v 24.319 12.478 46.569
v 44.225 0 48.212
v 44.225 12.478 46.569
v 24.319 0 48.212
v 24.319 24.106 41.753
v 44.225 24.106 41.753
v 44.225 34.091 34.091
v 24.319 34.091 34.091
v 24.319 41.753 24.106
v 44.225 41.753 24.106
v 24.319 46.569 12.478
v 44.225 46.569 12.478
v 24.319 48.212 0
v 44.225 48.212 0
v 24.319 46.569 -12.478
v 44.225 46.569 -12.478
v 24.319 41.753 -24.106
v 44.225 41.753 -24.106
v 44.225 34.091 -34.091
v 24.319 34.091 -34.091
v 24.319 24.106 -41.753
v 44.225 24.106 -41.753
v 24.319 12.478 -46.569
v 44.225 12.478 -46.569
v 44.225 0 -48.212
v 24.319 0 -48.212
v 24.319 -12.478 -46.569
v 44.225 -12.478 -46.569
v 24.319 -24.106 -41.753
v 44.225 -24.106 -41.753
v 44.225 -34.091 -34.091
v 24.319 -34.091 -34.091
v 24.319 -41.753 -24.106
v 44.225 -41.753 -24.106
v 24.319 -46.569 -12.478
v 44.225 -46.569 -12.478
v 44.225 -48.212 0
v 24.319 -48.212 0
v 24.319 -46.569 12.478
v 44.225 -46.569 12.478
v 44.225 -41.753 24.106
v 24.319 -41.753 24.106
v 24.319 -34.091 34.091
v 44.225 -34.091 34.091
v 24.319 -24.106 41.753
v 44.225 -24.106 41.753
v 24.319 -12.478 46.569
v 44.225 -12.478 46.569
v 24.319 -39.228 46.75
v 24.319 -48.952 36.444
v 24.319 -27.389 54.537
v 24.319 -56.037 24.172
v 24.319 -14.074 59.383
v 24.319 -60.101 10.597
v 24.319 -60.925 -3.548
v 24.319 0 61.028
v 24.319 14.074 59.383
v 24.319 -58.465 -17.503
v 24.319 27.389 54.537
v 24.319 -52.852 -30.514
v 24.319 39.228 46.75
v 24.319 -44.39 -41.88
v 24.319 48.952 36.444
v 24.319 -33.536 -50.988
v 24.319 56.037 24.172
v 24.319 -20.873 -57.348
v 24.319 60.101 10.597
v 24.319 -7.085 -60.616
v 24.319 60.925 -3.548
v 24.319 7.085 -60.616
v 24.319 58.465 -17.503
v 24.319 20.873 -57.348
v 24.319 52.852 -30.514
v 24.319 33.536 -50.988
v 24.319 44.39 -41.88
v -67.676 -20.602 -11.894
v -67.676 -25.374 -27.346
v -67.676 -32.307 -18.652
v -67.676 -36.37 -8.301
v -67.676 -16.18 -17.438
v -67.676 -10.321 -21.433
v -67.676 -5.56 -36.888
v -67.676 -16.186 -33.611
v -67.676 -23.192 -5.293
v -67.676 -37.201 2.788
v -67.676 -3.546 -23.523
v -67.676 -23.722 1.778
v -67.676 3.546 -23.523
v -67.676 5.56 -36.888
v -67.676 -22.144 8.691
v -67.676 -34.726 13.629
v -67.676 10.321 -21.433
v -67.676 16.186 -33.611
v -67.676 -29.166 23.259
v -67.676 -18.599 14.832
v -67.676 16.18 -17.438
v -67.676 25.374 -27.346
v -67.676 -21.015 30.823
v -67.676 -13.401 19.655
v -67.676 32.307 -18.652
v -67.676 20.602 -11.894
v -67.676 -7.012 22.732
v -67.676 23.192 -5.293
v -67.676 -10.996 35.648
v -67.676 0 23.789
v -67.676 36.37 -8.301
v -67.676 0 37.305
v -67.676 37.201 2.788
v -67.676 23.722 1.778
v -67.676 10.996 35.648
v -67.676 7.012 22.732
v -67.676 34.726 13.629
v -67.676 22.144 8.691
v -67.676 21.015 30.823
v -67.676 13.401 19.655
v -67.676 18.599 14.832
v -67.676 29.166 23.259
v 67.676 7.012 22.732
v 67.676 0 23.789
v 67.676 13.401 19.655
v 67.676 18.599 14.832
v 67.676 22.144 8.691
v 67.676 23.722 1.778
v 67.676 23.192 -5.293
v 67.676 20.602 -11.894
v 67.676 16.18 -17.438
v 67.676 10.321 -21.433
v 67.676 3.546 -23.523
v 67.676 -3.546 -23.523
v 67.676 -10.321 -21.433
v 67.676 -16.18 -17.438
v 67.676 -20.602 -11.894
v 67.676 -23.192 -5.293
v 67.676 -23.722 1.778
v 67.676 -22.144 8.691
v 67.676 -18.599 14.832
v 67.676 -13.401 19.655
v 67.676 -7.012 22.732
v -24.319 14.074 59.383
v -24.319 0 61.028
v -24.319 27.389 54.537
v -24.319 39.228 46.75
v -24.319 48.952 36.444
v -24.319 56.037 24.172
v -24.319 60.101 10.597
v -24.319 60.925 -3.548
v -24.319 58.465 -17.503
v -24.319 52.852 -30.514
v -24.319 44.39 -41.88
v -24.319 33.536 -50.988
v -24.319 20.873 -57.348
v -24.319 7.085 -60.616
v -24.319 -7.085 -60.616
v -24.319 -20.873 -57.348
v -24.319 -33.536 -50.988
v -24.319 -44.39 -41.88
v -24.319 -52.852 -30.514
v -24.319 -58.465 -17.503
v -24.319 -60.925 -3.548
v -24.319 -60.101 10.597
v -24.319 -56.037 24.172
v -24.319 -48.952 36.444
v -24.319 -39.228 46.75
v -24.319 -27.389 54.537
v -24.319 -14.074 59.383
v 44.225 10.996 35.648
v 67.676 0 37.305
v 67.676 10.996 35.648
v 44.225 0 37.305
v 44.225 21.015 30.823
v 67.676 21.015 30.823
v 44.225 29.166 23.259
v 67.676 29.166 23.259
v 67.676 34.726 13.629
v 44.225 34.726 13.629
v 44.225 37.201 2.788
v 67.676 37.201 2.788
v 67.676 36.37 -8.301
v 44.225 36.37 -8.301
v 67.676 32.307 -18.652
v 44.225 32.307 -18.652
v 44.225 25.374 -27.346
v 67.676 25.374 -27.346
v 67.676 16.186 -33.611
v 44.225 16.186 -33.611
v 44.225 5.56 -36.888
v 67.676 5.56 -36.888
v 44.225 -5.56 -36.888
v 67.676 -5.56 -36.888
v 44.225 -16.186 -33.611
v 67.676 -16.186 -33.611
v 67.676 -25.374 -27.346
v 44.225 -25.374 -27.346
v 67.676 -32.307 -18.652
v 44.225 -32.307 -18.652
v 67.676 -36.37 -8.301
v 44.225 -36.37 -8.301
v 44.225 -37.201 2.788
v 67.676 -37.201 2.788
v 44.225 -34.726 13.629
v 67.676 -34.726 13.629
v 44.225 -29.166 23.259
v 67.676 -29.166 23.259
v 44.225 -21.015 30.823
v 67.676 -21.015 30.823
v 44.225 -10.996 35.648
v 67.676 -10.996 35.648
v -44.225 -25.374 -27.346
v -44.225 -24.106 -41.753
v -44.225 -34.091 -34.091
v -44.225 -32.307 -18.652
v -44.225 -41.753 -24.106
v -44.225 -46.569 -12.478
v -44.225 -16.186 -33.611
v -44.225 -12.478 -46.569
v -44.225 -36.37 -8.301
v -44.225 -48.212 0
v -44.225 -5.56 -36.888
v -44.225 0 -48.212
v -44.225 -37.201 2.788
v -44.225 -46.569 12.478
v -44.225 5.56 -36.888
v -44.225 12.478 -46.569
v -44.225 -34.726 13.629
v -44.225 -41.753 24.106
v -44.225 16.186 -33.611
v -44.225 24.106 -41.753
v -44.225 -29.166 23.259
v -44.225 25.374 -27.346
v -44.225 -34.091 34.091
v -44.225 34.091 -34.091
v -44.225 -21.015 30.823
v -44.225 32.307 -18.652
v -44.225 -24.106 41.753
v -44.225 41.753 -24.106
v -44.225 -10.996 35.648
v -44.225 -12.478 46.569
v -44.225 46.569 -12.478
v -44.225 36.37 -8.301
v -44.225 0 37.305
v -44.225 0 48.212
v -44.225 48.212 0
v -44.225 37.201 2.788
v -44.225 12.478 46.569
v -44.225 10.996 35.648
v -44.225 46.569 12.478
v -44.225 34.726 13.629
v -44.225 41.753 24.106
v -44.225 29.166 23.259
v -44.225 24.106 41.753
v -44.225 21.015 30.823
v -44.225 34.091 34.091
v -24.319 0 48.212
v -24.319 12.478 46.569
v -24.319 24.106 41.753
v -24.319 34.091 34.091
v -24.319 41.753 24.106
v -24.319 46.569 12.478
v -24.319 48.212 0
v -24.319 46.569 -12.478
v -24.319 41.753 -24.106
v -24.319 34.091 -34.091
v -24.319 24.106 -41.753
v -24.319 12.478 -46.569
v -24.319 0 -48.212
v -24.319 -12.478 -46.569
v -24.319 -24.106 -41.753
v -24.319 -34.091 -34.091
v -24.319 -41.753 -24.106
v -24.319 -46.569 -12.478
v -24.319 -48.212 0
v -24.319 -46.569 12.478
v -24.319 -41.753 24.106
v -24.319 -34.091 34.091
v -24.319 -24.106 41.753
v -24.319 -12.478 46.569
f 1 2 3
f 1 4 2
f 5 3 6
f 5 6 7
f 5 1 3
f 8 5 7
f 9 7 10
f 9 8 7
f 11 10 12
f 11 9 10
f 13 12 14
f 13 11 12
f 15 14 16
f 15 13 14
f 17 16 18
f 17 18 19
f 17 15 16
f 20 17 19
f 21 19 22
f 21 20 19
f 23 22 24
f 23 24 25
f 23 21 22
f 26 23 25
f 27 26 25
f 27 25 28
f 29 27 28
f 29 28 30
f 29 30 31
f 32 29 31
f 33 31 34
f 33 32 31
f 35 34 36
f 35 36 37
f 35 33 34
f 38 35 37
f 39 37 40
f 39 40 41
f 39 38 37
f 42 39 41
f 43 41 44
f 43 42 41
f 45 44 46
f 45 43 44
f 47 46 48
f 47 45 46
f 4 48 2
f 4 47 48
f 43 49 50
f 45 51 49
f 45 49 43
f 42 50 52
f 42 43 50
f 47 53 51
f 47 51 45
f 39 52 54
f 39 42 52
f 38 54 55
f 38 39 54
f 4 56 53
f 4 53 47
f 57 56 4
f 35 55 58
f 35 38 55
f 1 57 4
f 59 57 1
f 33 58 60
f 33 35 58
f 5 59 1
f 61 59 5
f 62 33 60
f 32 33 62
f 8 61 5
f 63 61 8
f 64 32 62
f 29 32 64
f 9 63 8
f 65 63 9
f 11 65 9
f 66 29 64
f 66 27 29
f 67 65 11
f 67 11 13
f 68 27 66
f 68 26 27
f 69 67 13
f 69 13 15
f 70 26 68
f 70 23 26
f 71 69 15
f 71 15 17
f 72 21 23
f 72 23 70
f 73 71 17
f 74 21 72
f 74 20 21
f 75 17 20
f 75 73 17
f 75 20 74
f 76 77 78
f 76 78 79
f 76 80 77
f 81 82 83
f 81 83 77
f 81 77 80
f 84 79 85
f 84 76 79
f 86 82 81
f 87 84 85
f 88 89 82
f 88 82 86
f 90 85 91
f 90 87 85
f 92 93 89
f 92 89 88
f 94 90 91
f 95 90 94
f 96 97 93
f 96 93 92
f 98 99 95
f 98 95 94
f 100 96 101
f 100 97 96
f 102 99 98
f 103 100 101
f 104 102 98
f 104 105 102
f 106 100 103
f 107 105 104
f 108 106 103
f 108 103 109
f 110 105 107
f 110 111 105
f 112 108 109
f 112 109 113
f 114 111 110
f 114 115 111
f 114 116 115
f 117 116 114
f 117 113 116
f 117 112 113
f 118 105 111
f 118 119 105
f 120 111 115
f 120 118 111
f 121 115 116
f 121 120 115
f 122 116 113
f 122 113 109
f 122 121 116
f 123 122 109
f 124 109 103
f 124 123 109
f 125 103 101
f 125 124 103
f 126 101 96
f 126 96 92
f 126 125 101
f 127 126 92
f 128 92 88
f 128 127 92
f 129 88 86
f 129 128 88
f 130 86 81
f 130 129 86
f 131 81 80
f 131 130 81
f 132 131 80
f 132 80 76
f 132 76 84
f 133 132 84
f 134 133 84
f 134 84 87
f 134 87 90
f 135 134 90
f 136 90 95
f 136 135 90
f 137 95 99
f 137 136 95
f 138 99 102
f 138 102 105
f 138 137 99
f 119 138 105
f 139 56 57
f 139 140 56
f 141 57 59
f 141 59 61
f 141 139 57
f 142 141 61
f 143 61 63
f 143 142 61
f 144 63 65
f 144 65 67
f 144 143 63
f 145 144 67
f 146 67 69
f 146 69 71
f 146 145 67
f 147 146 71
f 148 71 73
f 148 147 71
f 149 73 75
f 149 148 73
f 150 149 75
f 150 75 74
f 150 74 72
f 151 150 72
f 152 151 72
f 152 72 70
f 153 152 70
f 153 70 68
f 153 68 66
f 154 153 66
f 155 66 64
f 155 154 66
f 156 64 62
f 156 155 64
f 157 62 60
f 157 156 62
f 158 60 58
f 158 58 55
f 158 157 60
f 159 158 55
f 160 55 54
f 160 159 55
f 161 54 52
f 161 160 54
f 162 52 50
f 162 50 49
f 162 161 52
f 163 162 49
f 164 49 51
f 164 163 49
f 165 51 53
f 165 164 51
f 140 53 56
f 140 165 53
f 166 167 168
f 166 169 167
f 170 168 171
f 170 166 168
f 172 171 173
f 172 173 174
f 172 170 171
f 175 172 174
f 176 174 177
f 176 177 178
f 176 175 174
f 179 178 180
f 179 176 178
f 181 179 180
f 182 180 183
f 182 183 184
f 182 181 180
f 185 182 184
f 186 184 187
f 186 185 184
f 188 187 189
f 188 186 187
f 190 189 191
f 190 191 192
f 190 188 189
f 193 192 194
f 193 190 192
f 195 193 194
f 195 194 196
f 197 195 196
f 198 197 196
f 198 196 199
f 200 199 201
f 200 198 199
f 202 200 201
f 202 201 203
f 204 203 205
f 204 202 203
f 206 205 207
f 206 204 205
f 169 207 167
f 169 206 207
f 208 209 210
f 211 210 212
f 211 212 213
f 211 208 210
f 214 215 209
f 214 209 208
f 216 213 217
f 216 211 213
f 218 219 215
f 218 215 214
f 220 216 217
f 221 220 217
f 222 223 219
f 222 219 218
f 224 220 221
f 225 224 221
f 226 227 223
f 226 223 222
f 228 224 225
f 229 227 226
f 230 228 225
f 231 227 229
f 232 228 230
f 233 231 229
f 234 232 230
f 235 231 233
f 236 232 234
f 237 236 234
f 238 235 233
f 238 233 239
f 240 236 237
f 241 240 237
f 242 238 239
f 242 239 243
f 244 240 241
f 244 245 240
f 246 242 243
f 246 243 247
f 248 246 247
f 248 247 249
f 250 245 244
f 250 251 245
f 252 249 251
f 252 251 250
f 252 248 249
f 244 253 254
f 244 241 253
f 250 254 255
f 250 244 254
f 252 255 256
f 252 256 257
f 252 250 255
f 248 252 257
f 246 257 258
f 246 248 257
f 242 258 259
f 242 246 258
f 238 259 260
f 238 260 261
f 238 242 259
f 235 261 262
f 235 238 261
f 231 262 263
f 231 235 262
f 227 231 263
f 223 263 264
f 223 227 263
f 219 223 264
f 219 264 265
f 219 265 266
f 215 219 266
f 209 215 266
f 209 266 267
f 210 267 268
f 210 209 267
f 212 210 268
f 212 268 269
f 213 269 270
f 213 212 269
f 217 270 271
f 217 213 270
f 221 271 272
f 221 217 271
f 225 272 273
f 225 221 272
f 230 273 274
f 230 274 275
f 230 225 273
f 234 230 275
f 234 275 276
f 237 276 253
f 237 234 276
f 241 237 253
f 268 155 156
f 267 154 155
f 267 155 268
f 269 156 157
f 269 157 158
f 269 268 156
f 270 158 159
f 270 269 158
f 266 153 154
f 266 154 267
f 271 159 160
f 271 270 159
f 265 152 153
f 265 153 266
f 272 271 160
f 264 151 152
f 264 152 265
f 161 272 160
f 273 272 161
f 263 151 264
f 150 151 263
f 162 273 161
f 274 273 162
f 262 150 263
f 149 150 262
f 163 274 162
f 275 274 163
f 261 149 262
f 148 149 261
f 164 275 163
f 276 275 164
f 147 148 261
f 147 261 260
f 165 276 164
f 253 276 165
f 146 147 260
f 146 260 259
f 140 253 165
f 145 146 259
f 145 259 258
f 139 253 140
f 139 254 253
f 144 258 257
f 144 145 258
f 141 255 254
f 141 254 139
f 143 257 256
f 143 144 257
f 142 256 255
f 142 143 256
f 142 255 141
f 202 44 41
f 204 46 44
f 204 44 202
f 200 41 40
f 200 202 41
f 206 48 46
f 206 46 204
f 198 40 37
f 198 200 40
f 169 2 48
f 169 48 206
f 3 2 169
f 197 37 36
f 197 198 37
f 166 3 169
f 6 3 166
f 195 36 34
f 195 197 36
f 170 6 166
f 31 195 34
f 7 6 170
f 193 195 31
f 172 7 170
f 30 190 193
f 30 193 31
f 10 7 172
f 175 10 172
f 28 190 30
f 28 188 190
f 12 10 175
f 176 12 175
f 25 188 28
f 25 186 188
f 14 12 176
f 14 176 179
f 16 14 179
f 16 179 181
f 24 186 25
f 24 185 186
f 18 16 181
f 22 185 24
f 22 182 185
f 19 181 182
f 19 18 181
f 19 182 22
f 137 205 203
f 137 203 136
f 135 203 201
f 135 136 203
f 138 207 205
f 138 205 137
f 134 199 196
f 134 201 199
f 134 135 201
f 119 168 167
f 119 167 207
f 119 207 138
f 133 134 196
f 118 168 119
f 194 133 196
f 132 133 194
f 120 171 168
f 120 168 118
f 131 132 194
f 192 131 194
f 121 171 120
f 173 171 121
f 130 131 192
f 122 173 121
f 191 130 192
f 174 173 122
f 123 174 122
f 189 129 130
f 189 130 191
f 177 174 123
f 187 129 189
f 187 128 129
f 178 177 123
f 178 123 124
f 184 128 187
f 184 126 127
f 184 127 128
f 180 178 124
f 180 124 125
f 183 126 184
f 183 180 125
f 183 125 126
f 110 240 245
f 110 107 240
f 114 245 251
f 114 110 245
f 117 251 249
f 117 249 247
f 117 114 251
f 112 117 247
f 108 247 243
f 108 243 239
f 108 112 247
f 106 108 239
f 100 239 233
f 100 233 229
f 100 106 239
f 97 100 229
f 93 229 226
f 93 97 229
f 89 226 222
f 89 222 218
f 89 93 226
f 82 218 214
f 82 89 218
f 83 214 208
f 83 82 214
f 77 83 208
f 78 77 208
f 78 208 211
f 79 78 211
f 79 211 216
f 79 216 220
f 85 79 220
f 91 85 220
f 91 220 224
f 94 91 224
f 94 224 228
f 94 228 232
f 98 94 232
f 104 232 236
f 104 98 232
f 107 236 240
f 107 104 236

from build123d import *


with BuildPart() as f1:
    # F0 (on Front) → F1 (revolve)
    with BuildSketch(Plane.XZ):
        Polygon((24.319377, 61.028399), (0, 61.028399), (0, 23.788566), (67.676023, 23.788566), (67.676023, 37.304949), (44.225264, 37.304949), (44.225264, 48.212282), (24.319377, 48.212282), align=None)
        Polygon((0, 23.788566), (0, 61.028399), (-24.319377, 61.028399), (-24.319377, 48.212282), (-44.225264, 48.212282), (-44.225264, 37.304949), (-67.676023, 37.304949), (-67.676023, 23.788566), align=None)
    revolve(axis=Axis((2.036428, 0, 0), (-1, 0, 0)))


solid = f1.part
